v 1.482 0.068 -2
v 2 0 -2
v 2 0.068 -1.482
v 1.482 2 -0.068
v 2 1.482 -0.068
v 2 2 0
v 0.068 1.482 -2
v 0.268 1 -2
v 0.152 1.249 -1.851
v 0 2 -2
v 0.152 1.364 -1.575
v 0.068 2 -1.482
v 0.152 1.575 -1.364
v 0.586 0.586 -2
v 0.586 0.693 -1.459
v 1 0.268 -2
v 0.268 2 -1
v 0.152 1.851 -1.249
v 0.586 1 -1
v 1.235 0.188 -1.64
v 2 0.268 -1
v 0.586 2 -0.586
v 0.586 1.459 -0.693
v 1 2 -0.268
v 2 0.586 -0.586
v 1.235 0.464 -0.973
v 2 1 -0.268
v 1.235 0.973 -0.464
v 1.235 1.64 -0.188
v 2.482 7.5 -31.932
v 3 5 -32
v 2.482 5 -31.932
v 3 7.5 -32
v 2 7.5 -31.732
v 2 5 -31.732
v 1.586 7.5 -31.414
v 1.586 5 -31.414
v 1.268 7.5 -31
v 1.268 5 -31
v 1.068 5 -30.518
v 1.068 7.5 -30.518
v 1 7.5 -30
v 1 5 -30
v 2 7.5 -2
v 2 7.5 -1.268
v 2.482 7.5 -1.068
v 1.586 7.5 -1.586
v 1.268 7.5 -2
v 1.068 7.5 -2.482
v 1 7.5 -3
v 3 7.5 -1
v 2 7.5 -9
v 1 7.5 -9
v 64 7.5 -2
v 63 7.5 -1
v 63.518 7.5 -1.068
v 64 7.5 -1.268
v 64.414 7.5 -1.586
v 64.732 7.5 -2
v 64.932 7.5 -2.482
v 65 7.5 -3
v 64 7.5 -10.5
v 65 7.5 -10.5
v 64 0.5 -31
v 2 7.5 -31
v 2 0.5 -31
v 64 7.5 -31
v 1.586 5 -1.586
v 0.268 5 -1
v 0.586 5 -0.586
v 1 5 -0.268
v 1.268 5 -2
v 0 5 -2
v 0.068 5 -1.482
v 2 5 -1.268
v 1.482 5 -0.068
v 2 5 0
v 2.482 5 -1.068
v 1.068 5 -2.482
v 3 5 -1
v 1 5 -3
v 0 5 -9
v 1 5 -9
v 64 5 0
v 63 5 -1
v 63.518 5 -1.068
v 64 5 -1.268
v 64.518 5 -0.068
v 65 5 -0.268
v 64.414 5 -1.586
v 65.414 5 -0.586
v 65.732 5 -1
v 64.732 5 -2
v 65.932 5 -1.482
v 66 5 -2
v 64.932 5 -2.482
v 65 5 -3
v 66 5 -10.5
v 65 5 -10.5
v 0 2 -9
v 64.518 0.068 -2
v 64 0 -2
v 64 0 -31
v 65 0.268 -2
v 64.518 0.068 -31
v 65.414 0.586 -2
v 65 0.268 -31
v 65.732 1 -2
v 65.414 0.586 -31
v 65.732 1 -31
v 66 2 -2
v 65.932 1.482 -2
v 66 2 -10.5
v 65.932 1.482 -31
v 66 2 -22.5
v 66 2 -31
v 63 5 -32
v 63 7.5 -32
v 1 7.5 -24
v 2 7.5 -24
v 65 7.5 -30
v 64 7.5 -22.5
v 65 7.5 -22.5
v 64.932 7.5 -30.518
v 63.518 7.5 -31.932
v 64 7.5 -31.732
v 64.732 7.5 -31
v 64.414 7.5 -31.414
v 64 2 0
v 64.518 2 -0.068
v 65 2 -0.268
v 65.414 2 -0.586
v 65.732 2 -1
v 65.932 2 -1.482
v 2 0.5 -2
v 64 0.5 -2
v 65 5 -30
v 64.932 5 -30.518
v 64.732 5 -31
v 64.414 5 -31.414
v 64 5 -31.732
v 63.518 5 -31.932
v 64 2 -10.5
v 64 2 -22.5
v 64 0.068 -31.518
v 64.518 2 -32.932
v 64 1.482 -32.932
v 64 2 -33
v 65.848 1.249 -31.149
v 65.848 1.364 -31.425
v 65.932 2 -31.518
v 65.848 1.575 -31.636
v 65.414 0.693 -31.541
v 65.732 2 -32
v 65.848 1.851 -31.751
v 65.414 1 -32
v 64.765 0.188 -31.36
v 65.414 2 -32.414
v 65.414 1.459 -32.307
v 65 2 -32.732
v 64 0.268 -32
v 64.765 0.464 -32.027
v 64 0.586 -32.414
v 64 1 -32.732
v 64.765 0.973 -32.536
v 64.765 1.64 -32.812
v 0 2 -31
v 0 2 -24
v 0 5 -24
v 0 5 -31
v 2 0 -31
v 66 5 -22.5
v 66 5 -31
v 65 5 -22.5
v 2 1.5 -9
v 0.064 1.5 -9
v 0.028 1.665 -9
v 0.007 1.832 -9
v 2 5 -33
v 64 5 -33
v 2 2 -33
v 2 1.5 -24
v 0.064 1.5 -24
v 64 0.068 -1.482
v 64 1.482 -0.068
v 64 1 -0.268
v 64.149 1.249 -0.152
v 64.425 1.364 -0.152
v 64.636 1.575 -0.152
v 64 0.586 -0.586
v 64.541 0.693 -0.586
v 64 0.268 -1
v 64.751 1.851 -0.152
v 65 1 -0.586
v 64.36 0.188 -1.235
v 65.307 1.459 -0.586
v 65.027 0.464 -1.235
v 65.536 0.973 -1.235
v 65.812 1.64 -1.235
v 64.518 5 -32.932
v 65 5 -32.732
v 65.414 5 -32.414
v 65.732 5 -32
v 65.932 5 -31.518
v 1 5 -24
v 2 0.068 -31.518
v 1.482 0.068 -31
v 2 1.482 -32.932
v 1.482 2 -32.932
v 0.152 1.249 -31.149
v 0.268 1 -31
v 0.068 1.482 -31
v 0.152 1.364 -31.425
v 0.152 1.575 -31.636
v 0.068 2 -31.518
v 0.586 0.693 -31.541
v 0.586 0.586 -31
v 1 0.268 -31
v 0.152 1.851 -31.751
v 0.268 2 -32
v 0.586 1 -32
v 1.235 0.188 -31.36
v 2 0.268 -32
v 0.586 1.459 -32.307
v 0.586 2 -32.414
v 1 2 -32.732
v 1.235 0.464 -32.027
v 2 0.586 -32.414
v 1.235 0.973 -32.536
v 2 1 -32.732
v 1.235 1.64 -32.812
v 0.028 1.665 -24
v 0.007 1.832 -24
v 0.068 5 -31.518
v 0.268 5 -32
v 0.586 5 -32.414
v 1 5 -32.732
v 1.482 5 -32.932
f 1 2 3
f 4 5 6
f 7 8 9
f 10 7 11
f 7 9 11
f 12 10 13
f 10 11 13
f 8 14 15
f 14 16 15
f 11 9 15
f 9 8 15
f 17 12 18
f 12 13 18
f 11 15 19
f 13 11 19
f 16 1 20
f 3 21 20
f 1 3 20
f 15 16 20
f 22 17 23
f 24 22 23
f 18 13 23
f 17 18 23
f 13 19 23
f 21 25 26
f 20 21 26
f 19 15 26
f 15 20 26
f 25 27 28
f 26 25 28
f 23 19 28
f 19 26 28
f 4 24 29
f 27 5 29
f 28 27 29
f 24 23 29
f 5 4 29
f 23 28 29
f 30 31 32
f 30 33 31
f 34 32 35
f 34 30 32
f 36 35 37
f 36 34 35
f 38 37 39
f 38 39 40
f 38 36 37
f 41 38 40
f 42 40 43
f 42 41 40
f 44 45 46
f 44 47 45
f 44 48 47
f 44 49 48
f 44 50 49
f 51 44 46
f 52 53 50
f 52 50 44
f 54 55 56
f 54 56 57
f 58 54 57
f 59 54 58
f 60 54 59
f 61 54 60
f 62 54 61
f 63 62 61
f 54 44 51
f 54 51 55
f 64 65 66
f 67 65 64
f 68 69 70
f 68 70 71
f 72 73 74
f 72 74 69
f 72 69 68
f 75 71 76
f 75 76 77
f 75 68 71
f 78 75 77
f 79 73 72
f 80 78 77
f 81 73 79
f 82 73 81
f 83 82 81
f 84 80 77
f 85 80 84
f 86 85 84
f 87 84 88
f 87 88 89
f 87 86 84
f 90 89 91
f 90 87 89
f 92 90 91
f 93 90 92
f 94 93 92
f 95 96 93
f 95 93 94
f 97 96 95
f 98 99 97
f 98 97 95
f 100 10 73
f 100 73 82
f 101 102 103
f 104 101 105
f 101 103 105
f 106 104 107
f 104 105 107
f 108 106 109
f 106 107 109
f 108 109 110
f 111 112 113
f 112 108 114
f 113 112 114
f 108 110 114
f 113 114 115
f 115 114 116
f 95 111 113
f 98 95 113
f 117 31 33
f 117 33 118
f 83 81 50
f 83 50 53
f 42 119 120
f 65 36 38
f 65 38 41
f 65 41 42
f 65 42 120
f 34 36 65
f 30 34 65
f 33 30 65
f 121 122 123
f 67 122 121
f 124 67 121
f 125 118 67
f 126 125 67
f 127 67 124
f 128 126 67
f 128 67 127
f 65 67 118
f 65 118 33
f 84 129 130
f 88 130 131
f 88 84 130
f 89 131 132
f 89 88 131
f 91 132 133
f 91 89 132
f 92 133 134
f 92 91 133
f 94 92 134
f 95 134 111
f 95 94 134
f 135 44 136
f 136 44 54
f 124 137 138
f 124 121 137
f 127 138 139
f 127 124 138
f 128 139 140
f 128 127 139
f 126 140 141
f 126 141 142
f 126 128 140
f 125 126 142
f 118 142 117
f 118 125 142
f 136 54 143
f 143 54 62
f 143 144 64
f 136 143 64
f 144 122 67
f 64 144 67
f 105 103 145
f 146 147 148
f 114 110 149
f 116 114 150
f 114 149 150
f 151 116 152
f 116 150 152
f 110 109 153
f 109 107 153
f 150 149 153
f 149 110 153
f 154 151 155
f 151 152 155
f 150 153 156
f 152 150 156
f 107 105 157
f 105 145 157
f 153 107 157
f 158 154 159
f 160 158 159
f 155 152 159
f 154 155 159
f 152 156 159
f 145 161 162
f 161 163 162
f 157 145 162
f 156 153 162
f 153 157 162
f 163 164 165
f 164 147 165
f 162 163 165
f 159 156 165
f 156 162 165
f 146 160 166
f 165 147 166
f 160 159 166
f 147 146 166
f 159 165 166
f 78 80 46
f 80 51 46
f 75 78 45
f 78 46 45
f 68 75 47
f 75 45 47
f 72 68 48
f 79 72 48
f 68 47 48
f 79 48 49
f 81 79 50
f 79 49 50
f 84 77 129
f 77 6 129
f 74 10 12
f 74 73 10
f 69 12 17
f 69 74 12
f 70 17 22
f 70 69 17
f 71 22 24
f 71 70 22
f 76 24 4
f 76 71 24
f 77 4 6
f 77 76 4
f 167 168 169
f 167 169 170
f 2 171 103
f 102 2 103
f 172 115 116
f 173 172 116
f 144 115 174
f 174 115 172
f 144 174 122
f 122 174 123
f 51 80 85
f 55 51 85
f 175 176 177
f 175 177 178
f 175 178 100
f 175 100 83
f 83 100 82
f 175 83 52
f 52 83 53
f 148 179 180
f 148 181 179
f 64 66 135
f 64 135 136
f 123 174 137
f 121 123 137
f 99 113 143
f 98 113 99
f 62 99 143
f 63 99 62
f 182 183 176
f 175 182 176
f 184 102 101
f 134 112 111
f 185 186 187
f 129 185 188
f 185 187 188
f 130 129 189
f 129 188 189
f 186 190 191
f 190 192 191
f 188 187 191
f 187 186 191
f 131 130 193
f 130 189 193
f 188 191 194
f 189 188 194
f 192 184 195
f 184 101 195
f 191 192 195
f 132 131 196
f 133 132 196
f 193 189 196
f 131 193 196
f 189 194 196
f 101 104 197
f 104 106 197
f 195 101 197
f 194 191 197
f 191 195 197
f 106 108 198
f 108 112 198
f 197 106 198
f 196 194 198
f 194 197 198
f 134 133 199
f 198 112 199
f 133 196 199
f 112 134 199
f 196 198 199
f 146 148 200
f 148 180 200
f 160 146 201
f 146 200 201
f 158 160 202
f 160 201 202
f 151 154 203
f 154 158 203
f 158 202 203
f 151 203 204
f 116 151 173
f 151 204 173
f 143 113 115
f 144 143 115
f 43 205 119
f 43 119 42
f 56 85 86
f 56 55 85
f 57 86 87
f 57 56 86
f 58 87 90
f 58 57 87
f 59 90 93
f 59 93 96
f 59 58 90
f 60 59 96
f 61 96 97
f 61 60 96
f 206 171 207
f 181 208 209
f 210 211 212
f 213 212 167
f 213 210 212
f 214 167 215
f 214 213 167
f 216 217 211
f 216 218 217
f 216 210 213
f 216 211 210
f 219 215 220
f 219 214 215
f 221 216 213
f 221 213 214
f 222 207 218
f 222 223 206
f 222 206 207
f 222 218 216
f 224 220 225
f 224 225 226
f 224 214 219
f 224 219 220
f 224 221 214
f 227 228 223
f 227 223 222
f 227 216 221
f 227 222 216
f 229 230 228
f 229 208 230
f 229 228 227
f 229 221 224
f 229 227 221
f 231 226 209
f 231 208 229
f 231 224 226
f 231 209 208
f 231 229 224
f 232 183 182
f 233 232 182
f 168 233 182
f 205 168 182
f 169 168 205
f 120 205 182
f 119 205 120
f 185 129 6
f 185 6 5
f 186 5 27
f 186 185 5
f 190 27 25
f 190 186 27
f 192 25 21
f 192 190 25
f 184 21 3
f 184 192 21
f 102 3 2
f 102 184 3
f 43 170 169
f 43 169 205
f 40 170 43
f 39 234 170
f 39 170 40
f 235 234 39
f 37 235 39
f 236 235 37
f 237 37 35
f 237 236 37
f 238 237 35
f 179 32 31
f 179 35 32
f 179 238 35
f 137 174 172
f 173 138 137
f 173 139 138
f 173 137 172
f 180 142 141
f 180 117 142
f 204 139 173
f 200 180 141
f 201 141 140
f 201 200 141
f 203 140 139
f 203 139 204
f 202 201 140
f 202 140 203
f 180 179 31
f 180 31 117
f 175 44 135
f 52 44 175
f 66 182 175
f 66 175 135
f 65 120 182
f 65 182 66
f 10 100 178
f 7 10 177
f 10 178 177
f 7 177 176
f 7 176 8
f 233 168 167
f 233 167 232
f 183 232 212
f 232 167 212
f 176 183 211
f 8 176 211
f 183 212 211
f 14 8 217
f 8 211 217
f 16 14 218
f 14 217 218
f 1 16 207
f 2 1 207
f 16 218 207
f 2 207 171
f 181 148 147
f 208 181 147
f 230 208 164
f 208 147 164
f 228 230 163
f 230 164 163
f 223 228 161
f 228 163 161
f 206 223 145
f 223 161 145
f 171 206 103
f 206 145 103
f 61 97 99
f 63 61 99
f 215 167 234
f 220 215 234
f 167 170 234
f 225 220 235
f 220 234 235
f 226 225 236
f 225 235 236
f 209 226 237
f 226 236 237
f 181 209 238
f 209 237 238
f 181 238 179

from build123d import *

# Parameters (mm, degrees)
SKETCH1_W           = 66
SKETCH1_H           = 33
BOSS_EXTRUDE1_DEPTH = 5
SKETCH2_W           = 64
SKETCH2_H           = 31
BOSS_EXTRUDE2_DEPTH = 2.5
SKETCH3_W           = 62
SKETCH3_H           = 29
CUT_EXTRUDE1_DEPTH  = 7
FILLET1_R           = 2
FILLET2_R           = 2
SKETCH4_W           = 12
SKETCH4_H           = 2.5
CUT_EXTRUDE2_DEPTH  = 7
SKETCH10_W          = 12
SKETCH10_H          = 3
CUT_EXTRUDE3_DEPTH  = 7
SKETCH11_W          = 15
SKETCH11_H          = 2.5
CUT_EXTRUDE4_DEPTH  = 7
SKETCH12_W          = 15
SKETCH12_H          = 3.5
CUT_EXTRUDE5_DEPTH  = 7


with BuildPart() as part:
    # Sketch1 → Boss-Extrude1 (new body)
    with BuildSketch(Plane(origin=(0, 0, 0), x_dir=(1, 0, 0), z_dir=(0, 1, 0))):
        with Locations((33, 16.5)):
            Rectangle(SKETCH1_W, SKETCH1_H)
    extrude(amount=BOSS_EXTRUDE1_DEPTH)

    # Sketch2 → Boss-Extrude2 (add)
    with BuildSketch(Plane(origin=(0, 5, 0), x_dir=(1, 0, 0), z_dir=(0, 1, 0))):
        with Locations((33, 16.5)):
            Rectangle(SKETCH2_W, SKETCH2_H)
    extrude(amount=BOSS_EXTRUDE2_DEPTH)

    # Sketch3 → Cut-Extrude1 (cut)
    with BuildSketch(Plane(origin=(0, 7.5, 0), x_dir=(1, 0, 0), z_dir=(0, 1, 0))):
        with Locations((33, 16.5)):
            Rectangle(SKETCH3_W, SKETCH3_H)
    extrude(amount=-CUT_EXTRUDE1_DEPTH, mode=Mode.SUBTRACT)

    # Fillet1
    fillet1_edges = [part.edges().sort_by_distance(p)[0] for p in [
        (33, 0, -33),
        (66, 0, -16.5),
        (33, 0, 0),
        (0, 0, -16.5),
        (0, 2.5, -33),
        (66, 2.5, -33),
        (66, 2.5, 0),
        (0, 2.5, 0),
    ]]
    fillet(fillet1_edges, radius=FILLET1_R)

    # Fillet2
    fillet2_edges = [part.edges().sort_by_distance(p)[0] for p in [
        (1, 6.25, -32),
        (1, 6.25, -1),
        (65, 6.25, -1),
        (65, 6.25, -32),
    ]]
    fillet(fillet2_edges, radius=FILLET2_R)

    # Sketch4 → Cut-Extrude2 (cut)
    with BuildSketch(Plane(origin=(65, 0, 0), x_dir=(0, 0, -1), z_dir=(1, 0, 0))):
        with Locations((16.5, 6.25)):
            Rectangle(SKETCH4_W, SKETCH4_H)
    extrude(amount=-CUT_EXTRUDE2_DEPTH, mode=Mode.SUBTRACT)

    # Sketch10 → Cut-Extrude3 (cut)
    with BuildSketch(Plane(origin=(66, 0, 0), x_dir=(0, 0, -1), z_dir=(1, 0, 0))):
        with Locations((16.5, 3.5)):
            Rectangle(SKETCH10_W, SKETCH10_H)
    extrude(amount=-CUT_EXTRUDE3_DEPTH, mode=Mode.SUBTRACT)

    # Sketch11 → Cut-Extrude4 (cut)
    with BuildSketch(Plane.ZY.offset(-1)):
        with Locations((-16.5, 6.25)):
            Rectangle(SKETCH11_W, SKETCH11_H)
    extrude(amount=-CUT_EXTRUDE4_DEPTH, mode=Mode.SUBTRACT)

    # Sketch12 → Cut-Extrude5 (cut)
    with BuildSketch(Plane.ZY):
        with Locations((-16.5, 3.25)):
            Rectangle(SKETCH12_W, SKETCH12_H)
    extrude(amount=-CUT_EXTRUDE5_DEPTH, mode=Mode.SUBTRACT)


solid = part.part
